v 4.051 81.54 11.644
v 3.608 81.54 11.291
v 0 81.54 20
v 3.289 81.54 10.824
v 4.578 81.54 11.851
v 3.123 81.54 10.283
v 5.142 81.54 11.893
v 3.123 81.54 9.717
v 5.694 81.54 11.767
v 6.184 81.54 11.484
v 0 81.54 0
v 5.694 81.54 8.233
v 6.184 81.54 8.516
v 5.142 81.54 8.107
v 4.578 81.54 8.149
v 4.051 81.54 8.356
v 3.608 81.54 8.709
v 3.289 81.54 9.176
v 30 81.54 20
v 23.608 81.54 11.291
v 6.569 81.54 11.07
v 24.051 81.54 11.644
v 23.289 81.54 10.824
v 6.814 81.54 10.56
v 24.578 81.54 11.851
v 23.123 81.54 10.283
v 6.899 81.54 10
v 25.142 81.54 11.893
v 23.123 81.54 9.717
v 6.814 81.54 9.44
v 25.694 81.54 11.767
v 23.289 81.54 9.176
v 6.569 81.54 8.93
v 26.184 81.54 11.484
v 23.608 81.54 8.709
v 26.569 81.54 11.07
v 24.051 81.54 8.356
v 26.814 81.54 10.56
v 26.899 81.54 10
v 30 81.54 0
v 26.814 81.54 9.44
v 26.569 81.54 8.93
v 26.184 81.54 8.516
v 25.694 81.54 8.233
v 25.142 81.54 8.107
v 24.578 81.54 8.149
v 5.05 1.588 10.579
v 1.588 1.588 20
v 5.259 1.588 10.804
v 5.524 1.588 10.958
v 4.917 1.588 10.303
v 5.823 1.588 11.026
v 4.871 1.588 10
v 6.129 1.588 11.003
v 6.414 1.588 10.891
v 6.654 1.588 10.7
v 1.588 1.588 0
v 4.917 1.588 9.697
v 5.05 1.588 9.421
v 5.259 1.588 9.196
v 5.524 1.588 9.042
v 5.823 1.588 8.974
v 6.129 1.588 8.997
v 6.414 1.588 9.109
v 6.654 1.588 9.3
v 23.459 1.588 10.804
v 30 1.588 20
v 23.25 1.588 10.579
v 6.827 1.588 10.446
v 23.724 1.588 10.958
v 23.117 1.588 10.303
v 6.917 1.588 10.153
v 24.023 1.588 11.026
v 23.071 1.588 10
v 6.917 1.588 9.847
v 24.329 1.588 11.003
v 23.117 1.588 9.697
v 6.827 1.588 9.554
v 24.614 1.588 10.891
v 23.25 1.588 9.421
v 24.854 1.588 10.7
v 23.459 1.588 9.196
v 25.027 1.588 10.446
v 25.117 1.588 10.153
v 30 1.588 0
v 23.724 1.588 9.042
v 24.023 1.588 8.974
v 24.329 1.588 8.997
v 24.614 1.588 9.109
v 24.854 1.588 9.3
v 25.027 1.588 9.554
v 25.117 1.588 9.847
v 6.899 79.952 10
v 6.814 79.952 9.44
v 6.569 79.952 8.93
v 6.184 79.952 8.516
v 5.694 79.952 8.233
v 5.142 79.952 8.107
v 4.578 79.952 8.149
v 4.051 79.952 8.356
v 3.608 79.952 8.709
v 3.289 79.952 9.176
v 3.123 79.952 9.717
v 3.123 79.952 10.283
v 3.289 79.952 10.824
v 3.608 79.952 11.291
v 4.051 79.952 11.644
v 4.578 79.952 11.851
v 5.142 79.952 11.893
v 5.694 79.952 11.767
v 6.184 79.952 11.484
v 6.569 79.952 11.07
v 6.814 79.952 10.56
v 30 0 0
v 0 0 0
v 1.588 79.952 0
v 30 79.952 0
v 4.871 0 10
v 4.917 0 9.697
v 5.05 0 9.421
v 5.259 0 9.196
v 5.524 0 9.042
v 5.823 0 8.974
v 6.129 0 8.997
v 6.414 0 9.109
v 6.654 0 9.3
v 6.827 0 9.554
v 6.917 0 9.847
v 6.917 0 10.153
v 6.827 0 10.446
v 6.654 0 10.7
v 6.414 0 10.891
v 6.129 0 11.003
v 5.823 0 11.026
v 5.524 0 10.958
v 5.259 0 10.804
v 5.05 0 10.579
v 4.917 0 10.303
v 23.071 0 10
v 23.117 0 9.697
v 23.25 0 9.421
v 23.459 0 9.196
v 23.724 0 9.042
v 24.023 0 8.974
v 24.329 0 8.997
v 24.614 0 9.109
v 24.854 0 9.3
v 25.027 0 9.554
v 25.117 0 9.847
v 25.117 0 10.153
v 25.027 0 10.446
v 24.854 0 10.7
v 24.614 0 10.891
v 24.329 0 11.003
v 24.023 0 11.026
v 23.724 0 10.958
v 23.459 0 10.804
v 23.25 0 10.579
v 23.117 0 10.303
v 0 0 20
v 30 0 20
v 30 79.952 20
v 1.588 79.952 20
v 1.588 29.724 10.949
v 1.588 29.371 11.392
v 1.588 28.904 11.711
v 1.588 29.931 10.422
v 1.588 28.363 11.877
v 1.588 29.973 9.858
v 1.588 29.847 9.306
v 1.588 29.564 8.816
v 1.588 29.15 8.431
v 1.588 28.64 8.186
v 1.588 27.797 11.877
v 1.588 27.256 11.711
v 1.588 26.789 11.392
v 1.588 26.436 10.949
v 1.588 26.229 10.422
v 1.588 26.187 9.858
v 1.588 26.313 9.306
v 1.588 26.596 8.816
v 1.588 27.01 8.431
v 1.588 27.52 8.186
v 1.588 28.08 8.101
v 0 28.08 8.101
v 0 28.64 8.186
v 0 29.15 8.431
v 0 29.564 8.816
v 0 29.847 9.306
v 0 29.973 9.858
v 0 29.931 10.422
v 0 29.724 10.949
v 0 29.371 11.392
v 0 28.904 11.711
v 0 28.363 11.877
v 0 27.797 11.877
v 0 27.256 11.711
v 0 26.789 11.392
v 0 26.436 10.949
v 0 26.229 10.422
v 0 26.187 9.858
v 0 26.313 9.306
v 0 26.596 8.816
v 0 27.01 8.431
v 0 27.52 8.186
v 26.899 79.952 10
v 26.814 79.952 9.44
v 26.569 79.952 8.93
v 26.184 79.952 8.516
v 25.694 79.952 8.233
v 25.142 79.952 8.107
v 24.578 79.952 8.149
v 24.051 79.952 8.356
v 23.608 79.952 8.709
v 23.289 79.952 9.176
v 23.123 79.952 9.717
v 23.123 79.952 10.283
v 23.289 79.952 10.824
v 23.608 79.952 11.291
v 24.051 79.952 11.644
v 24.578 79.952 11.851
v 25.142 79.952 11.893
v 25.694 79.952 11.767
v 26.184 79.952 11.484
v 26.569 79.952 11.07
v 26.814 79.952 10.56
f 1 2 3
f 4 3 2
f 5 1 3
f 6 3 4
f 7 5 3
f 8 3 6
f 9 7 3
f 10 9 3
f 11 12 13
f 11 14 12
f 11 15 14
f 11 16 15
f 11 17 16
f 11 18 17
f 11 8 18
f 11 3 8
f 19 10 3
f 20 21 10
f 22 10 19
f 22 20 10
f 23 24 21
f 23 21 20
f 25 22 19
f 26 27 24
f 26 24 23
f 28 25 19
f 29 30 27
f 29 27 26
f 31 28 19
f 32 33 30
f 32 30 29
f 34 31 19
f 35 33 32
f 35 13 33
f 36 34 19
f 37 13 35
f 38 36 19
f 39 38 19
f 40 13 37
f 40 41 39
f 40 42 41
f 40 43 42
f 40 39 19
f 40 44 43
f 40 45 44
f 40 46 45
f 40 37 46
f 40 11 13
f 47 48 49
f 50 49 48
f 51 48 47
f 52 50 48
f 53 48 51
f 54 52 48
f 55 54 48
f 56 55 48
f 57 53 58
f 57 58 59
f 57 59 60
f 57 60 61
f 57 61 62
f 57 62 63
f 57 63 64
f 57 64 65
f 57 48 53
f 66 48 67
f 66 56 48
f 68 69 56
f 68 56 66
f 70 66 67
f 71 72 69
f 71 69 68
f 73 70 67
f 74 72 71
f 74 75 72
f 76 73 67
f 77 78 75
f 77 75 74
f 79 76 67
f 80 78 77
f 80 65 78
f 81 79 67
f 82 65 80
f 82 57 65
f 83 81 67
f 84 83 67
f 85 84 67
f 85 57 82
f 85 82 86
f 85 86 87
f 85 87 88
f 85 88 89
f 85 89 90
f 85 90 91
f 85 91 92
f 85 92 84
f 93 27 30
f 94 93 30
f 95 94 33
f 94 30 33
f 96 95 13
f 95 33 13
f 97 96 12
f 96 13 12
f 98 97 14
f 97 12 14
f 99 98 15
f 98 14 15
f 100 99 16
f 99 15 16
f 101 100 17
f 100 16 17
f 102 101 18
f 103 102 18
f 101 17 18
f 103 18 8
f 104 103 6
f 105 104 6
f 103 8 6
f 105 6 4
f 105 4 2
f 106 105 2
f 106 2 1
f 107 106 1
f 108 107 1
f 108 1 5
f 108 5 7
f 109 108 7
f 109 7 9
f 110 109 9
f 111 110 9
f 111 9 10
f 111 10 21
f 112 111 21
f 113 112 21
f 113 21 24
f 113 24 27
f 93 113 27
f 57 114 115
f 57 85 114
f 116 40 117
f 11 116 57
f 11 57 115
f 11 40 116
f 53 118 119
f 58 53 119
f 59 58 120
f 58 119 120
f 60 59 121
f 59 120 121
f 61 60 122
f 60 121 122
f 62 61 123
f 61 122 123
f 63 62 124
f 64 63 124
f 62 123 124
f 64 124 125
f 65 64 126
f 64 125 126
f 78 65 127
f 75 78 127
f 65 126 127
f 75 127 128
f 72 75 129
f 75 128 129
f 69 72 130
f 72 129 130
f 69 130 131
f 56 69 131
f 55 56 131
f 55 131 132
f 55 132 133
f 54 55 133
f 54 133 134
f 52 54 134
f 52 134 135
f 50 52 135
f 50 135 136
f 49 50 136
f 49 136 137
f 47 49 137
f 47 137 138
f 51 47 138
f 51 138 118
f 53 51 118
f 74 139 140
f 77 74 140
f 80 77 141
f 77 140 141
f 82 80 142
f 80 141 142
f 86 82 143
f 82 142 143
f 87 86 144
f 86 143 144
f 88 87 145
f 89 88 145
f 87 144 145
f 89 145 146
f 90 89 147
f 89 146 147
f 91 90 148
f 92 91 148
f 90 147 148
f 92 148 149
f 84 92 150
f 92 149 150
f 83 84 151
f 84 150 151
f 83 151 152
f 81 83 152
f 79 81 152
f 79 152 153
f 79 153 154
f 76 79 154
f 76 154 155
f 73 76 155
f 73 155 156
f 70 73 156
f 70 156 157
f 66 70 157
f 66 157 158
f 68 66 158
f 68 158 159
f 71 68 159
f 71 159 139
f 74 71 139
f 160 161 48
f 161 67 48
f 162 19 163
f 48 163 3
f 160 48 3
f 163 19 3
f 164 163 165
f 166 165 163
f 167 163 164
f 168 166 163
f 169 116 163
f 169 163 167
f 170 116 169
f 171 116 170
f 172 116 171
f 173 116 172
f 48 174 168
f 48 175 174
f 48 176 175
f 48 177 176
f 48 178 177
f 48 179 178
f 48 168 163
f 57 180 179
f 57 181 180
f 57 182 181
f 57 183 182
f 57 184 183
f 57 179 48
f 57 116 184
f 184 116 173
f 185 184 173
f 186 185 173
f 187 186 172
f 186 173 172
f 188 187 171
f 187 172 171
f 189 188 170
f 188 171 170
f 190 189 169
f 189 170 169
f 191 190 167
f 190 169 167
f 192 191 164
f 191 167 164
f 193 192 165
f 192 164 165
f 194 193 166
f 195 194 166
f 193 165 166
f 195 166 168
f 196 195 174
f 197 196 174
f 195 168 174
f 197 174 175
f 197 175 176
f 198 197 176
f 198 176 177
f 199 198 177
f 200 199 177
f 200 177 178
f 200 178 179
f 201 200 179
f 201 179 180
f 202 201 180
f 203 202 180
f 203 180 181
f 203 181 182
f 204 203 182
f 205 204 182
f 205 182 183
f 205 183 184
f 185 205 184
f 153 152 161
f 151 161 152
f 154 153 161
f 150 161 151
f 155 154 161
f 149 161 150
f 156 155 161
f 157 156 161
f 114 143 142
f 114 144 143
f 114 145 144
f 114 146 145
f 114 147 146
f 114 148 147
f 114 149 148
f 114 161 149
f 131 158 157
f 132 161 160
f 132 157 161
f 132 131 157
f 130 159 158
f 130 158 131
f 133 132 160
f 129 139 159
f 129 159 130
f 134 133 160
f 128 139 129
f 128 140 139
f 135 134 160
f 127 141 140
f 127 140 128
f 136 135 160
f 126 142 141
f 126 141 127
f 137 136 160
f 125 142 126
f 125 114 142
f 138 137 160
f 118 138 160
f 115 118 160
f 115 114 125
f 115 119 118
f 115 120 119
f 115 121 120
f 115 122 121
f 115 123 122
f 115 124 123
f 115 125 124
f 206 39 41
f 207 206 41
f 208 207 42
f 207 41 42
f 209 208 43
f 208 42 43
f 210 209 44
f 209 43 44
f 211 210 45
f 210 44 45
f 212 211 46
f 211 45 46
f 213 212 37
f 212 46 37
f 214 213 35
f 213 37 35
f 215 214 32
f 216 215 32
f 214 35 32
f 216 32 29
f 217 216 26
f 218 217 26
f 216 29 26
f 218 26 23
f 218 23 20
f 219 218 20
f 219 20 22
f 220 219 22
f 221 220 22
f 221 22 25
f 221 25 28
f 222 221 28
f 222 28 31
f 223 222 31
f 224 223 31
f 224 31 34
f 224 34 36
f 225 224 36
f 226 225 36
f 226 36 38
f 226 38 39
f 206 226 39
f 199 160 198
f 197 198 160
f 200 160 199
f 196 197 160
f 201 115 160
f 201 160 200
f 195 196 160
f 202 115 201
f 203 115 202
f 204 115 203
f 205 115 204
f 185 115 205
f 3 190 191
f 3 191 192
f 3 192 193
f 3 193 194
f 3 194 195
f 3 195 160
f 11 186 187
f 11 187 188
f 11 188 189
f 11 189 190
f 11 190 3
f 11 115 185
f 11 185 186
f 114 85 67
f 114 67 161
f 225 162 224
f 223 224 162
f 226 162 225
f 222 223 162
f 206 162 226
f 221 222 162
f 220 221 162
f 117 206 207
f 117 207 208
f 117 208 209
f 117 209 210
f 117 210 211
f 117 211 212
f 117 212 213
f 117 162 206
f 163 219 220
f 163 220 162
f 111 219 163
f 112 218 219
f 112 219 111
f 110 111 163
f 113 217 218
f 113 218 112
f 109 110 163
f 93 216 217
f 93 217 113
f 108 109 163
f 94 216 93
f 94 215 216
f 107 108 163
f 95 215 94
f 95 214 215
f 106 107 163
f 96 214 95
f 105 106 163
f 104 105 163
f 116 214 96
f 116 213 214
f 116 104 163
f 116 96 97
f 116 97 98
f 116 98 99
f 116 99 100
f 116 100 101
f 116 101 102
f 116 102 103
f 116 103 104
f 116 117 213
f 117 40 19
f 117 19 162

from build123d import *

# Parameters (mm, degrees)
BOSS_EXTRUDE1_DEPTH        = 20
F_6_CLEARANCE_HOLE1_REACH  = 91.156
F_6_CLEARANCE_HOLE1_BORE_R = 1.89865
F_1_CLEARANCE_HOLE1_REACH  = 91.156
F_1_CLEARANCE_HOLE1_BORE_R = 1.0287
F_6_CLEARANCE_HOLE2_D      = 3.7973


with BuildPart() as part:
    # Sketch1 → Boss-Extrude1 (new body)
    with BuildSketch(Plane.XY):
        Polygon((30, 0), (0, 0), (0, 81.54), (30, 81.54), (30, 79.9525), (1.5875, 79.9525), (1.5875, 1.5875), (30, 1.5875), align=None)
    extrude(amount=BOSS_EXTRUDE1_DEPTH)

    # #6 Clearance Hole1 bore → #6 Clearance Hole1 (cut, up to next)
    with BuildSketch(Plane(origin=(0, 81.54, 0), x_dir=(1, 0, 0), z_dir=(0, 1, 0)), mode=Mode.PRIVATE) as f_6_clearance_hole1_sk1:
        with Locations((5, -10)):
            Circle(F_6_CLEARANCE_HOLE1_BORE_R)
    f_6_clearance_hole1_tool1 = extrude(f_6_clearance_hole1_sk1.sketch, amount=-F_6_CLEARANCE_HOLE1_REACH, mode=Mode.PRIVATE) & part.part
    # #6 Clearance Hole1 bore → #6 Clearance Hole1 (cut, up to next)
    with BuildSketch(Plane(origin=(0, 81.54, 0), x_dir=(1, 0, 0), z_dir=(0, 1, 0)), mode=Mode.PRIVATE) as f_6_clearance_hole1_sk2:
        with Locations((25, -10)):
            Circle(F_6_CLEARANCE_HOLE1_BORE_R)
    f_6_clearance_hole1_tool2 = extrude(f_6_clearance_hole1_sk2.sketch, amount=-F_6_CLEARANCE_HOLE1_REACH, mode=Mode.PRIVATE) & part.part
    add(f_6_clearance_hole1_tool1.solids().sort_by_distance((5, 81.54, 10))[0], mode=Mode.SUBTRACT)
    add(f_6_clearance_hole1_tool2.solids().sort_by_distance((25, 81.54, 10))[0], mode=Mode.SUBTRACT)

    # #1 Clearance Hole1 bore → #1 Clearance Hole1 (cut, up to next)
    with BuildSketch(Plane(origin=(0, 0, 0), x_dir=(-1, 0, 0), z_dir=(0, -1, 0)), mode=Mode.PRIVATE) as f_1_clearance_hole1_sk1:
        with Locations((-5.9, -10)):
            Circle(F_1_CLEARANCE_HOLE1_BORE_R)
    f_1_clearance_hole1_tool1 = extrude(f_1_clearance_hole1_sk1.sketch, amount=-F_1_CLEARANCE_HOLE1_REACH, mode=Mode.PRIVATE) & part.part
    # #1 Clearance Hole1 bore → #1 Clearance Hole1 (cut, up to next)
    with BuildSketch(Plane(origin=(0, 0, 0), x_dir=(-1, 0, 0), z_dir=(0, -1, 0)), mode=Mode.PRIVATE) as f_1_clearance_hole1_sk2:
        with Locations((-24.1, -10)):
            Circle(F_1_CLEARANCE_HOLE1_BORE_R)
    f_1_clearance_hole1_tool2 = extrude(f_1_clearance_hole1_sk2.sketch, amount=-F_1_CLEARANCE_HOLE1_REACH, mode=Mode.PRIVATE) & part.part
    add(f_1_clearance_hole1_tool1.solids().sort_by_distance((5.9, 0, 10))[0], mode=Mode.SUBTRACT)
    add(f_1_clearance_hole1_tool2.solids().sort_by_distance((24.1, 0, 10))[0], mode=Mode.SUBTRACT)

    # #6 Clearance Hole2 (through all)
    with Locations(Plane.ZY):
        with Locations((10, 28.08)):
            Hole(F_6_CLEARANCE_HOLE2_D / 2)


solid = part.part
